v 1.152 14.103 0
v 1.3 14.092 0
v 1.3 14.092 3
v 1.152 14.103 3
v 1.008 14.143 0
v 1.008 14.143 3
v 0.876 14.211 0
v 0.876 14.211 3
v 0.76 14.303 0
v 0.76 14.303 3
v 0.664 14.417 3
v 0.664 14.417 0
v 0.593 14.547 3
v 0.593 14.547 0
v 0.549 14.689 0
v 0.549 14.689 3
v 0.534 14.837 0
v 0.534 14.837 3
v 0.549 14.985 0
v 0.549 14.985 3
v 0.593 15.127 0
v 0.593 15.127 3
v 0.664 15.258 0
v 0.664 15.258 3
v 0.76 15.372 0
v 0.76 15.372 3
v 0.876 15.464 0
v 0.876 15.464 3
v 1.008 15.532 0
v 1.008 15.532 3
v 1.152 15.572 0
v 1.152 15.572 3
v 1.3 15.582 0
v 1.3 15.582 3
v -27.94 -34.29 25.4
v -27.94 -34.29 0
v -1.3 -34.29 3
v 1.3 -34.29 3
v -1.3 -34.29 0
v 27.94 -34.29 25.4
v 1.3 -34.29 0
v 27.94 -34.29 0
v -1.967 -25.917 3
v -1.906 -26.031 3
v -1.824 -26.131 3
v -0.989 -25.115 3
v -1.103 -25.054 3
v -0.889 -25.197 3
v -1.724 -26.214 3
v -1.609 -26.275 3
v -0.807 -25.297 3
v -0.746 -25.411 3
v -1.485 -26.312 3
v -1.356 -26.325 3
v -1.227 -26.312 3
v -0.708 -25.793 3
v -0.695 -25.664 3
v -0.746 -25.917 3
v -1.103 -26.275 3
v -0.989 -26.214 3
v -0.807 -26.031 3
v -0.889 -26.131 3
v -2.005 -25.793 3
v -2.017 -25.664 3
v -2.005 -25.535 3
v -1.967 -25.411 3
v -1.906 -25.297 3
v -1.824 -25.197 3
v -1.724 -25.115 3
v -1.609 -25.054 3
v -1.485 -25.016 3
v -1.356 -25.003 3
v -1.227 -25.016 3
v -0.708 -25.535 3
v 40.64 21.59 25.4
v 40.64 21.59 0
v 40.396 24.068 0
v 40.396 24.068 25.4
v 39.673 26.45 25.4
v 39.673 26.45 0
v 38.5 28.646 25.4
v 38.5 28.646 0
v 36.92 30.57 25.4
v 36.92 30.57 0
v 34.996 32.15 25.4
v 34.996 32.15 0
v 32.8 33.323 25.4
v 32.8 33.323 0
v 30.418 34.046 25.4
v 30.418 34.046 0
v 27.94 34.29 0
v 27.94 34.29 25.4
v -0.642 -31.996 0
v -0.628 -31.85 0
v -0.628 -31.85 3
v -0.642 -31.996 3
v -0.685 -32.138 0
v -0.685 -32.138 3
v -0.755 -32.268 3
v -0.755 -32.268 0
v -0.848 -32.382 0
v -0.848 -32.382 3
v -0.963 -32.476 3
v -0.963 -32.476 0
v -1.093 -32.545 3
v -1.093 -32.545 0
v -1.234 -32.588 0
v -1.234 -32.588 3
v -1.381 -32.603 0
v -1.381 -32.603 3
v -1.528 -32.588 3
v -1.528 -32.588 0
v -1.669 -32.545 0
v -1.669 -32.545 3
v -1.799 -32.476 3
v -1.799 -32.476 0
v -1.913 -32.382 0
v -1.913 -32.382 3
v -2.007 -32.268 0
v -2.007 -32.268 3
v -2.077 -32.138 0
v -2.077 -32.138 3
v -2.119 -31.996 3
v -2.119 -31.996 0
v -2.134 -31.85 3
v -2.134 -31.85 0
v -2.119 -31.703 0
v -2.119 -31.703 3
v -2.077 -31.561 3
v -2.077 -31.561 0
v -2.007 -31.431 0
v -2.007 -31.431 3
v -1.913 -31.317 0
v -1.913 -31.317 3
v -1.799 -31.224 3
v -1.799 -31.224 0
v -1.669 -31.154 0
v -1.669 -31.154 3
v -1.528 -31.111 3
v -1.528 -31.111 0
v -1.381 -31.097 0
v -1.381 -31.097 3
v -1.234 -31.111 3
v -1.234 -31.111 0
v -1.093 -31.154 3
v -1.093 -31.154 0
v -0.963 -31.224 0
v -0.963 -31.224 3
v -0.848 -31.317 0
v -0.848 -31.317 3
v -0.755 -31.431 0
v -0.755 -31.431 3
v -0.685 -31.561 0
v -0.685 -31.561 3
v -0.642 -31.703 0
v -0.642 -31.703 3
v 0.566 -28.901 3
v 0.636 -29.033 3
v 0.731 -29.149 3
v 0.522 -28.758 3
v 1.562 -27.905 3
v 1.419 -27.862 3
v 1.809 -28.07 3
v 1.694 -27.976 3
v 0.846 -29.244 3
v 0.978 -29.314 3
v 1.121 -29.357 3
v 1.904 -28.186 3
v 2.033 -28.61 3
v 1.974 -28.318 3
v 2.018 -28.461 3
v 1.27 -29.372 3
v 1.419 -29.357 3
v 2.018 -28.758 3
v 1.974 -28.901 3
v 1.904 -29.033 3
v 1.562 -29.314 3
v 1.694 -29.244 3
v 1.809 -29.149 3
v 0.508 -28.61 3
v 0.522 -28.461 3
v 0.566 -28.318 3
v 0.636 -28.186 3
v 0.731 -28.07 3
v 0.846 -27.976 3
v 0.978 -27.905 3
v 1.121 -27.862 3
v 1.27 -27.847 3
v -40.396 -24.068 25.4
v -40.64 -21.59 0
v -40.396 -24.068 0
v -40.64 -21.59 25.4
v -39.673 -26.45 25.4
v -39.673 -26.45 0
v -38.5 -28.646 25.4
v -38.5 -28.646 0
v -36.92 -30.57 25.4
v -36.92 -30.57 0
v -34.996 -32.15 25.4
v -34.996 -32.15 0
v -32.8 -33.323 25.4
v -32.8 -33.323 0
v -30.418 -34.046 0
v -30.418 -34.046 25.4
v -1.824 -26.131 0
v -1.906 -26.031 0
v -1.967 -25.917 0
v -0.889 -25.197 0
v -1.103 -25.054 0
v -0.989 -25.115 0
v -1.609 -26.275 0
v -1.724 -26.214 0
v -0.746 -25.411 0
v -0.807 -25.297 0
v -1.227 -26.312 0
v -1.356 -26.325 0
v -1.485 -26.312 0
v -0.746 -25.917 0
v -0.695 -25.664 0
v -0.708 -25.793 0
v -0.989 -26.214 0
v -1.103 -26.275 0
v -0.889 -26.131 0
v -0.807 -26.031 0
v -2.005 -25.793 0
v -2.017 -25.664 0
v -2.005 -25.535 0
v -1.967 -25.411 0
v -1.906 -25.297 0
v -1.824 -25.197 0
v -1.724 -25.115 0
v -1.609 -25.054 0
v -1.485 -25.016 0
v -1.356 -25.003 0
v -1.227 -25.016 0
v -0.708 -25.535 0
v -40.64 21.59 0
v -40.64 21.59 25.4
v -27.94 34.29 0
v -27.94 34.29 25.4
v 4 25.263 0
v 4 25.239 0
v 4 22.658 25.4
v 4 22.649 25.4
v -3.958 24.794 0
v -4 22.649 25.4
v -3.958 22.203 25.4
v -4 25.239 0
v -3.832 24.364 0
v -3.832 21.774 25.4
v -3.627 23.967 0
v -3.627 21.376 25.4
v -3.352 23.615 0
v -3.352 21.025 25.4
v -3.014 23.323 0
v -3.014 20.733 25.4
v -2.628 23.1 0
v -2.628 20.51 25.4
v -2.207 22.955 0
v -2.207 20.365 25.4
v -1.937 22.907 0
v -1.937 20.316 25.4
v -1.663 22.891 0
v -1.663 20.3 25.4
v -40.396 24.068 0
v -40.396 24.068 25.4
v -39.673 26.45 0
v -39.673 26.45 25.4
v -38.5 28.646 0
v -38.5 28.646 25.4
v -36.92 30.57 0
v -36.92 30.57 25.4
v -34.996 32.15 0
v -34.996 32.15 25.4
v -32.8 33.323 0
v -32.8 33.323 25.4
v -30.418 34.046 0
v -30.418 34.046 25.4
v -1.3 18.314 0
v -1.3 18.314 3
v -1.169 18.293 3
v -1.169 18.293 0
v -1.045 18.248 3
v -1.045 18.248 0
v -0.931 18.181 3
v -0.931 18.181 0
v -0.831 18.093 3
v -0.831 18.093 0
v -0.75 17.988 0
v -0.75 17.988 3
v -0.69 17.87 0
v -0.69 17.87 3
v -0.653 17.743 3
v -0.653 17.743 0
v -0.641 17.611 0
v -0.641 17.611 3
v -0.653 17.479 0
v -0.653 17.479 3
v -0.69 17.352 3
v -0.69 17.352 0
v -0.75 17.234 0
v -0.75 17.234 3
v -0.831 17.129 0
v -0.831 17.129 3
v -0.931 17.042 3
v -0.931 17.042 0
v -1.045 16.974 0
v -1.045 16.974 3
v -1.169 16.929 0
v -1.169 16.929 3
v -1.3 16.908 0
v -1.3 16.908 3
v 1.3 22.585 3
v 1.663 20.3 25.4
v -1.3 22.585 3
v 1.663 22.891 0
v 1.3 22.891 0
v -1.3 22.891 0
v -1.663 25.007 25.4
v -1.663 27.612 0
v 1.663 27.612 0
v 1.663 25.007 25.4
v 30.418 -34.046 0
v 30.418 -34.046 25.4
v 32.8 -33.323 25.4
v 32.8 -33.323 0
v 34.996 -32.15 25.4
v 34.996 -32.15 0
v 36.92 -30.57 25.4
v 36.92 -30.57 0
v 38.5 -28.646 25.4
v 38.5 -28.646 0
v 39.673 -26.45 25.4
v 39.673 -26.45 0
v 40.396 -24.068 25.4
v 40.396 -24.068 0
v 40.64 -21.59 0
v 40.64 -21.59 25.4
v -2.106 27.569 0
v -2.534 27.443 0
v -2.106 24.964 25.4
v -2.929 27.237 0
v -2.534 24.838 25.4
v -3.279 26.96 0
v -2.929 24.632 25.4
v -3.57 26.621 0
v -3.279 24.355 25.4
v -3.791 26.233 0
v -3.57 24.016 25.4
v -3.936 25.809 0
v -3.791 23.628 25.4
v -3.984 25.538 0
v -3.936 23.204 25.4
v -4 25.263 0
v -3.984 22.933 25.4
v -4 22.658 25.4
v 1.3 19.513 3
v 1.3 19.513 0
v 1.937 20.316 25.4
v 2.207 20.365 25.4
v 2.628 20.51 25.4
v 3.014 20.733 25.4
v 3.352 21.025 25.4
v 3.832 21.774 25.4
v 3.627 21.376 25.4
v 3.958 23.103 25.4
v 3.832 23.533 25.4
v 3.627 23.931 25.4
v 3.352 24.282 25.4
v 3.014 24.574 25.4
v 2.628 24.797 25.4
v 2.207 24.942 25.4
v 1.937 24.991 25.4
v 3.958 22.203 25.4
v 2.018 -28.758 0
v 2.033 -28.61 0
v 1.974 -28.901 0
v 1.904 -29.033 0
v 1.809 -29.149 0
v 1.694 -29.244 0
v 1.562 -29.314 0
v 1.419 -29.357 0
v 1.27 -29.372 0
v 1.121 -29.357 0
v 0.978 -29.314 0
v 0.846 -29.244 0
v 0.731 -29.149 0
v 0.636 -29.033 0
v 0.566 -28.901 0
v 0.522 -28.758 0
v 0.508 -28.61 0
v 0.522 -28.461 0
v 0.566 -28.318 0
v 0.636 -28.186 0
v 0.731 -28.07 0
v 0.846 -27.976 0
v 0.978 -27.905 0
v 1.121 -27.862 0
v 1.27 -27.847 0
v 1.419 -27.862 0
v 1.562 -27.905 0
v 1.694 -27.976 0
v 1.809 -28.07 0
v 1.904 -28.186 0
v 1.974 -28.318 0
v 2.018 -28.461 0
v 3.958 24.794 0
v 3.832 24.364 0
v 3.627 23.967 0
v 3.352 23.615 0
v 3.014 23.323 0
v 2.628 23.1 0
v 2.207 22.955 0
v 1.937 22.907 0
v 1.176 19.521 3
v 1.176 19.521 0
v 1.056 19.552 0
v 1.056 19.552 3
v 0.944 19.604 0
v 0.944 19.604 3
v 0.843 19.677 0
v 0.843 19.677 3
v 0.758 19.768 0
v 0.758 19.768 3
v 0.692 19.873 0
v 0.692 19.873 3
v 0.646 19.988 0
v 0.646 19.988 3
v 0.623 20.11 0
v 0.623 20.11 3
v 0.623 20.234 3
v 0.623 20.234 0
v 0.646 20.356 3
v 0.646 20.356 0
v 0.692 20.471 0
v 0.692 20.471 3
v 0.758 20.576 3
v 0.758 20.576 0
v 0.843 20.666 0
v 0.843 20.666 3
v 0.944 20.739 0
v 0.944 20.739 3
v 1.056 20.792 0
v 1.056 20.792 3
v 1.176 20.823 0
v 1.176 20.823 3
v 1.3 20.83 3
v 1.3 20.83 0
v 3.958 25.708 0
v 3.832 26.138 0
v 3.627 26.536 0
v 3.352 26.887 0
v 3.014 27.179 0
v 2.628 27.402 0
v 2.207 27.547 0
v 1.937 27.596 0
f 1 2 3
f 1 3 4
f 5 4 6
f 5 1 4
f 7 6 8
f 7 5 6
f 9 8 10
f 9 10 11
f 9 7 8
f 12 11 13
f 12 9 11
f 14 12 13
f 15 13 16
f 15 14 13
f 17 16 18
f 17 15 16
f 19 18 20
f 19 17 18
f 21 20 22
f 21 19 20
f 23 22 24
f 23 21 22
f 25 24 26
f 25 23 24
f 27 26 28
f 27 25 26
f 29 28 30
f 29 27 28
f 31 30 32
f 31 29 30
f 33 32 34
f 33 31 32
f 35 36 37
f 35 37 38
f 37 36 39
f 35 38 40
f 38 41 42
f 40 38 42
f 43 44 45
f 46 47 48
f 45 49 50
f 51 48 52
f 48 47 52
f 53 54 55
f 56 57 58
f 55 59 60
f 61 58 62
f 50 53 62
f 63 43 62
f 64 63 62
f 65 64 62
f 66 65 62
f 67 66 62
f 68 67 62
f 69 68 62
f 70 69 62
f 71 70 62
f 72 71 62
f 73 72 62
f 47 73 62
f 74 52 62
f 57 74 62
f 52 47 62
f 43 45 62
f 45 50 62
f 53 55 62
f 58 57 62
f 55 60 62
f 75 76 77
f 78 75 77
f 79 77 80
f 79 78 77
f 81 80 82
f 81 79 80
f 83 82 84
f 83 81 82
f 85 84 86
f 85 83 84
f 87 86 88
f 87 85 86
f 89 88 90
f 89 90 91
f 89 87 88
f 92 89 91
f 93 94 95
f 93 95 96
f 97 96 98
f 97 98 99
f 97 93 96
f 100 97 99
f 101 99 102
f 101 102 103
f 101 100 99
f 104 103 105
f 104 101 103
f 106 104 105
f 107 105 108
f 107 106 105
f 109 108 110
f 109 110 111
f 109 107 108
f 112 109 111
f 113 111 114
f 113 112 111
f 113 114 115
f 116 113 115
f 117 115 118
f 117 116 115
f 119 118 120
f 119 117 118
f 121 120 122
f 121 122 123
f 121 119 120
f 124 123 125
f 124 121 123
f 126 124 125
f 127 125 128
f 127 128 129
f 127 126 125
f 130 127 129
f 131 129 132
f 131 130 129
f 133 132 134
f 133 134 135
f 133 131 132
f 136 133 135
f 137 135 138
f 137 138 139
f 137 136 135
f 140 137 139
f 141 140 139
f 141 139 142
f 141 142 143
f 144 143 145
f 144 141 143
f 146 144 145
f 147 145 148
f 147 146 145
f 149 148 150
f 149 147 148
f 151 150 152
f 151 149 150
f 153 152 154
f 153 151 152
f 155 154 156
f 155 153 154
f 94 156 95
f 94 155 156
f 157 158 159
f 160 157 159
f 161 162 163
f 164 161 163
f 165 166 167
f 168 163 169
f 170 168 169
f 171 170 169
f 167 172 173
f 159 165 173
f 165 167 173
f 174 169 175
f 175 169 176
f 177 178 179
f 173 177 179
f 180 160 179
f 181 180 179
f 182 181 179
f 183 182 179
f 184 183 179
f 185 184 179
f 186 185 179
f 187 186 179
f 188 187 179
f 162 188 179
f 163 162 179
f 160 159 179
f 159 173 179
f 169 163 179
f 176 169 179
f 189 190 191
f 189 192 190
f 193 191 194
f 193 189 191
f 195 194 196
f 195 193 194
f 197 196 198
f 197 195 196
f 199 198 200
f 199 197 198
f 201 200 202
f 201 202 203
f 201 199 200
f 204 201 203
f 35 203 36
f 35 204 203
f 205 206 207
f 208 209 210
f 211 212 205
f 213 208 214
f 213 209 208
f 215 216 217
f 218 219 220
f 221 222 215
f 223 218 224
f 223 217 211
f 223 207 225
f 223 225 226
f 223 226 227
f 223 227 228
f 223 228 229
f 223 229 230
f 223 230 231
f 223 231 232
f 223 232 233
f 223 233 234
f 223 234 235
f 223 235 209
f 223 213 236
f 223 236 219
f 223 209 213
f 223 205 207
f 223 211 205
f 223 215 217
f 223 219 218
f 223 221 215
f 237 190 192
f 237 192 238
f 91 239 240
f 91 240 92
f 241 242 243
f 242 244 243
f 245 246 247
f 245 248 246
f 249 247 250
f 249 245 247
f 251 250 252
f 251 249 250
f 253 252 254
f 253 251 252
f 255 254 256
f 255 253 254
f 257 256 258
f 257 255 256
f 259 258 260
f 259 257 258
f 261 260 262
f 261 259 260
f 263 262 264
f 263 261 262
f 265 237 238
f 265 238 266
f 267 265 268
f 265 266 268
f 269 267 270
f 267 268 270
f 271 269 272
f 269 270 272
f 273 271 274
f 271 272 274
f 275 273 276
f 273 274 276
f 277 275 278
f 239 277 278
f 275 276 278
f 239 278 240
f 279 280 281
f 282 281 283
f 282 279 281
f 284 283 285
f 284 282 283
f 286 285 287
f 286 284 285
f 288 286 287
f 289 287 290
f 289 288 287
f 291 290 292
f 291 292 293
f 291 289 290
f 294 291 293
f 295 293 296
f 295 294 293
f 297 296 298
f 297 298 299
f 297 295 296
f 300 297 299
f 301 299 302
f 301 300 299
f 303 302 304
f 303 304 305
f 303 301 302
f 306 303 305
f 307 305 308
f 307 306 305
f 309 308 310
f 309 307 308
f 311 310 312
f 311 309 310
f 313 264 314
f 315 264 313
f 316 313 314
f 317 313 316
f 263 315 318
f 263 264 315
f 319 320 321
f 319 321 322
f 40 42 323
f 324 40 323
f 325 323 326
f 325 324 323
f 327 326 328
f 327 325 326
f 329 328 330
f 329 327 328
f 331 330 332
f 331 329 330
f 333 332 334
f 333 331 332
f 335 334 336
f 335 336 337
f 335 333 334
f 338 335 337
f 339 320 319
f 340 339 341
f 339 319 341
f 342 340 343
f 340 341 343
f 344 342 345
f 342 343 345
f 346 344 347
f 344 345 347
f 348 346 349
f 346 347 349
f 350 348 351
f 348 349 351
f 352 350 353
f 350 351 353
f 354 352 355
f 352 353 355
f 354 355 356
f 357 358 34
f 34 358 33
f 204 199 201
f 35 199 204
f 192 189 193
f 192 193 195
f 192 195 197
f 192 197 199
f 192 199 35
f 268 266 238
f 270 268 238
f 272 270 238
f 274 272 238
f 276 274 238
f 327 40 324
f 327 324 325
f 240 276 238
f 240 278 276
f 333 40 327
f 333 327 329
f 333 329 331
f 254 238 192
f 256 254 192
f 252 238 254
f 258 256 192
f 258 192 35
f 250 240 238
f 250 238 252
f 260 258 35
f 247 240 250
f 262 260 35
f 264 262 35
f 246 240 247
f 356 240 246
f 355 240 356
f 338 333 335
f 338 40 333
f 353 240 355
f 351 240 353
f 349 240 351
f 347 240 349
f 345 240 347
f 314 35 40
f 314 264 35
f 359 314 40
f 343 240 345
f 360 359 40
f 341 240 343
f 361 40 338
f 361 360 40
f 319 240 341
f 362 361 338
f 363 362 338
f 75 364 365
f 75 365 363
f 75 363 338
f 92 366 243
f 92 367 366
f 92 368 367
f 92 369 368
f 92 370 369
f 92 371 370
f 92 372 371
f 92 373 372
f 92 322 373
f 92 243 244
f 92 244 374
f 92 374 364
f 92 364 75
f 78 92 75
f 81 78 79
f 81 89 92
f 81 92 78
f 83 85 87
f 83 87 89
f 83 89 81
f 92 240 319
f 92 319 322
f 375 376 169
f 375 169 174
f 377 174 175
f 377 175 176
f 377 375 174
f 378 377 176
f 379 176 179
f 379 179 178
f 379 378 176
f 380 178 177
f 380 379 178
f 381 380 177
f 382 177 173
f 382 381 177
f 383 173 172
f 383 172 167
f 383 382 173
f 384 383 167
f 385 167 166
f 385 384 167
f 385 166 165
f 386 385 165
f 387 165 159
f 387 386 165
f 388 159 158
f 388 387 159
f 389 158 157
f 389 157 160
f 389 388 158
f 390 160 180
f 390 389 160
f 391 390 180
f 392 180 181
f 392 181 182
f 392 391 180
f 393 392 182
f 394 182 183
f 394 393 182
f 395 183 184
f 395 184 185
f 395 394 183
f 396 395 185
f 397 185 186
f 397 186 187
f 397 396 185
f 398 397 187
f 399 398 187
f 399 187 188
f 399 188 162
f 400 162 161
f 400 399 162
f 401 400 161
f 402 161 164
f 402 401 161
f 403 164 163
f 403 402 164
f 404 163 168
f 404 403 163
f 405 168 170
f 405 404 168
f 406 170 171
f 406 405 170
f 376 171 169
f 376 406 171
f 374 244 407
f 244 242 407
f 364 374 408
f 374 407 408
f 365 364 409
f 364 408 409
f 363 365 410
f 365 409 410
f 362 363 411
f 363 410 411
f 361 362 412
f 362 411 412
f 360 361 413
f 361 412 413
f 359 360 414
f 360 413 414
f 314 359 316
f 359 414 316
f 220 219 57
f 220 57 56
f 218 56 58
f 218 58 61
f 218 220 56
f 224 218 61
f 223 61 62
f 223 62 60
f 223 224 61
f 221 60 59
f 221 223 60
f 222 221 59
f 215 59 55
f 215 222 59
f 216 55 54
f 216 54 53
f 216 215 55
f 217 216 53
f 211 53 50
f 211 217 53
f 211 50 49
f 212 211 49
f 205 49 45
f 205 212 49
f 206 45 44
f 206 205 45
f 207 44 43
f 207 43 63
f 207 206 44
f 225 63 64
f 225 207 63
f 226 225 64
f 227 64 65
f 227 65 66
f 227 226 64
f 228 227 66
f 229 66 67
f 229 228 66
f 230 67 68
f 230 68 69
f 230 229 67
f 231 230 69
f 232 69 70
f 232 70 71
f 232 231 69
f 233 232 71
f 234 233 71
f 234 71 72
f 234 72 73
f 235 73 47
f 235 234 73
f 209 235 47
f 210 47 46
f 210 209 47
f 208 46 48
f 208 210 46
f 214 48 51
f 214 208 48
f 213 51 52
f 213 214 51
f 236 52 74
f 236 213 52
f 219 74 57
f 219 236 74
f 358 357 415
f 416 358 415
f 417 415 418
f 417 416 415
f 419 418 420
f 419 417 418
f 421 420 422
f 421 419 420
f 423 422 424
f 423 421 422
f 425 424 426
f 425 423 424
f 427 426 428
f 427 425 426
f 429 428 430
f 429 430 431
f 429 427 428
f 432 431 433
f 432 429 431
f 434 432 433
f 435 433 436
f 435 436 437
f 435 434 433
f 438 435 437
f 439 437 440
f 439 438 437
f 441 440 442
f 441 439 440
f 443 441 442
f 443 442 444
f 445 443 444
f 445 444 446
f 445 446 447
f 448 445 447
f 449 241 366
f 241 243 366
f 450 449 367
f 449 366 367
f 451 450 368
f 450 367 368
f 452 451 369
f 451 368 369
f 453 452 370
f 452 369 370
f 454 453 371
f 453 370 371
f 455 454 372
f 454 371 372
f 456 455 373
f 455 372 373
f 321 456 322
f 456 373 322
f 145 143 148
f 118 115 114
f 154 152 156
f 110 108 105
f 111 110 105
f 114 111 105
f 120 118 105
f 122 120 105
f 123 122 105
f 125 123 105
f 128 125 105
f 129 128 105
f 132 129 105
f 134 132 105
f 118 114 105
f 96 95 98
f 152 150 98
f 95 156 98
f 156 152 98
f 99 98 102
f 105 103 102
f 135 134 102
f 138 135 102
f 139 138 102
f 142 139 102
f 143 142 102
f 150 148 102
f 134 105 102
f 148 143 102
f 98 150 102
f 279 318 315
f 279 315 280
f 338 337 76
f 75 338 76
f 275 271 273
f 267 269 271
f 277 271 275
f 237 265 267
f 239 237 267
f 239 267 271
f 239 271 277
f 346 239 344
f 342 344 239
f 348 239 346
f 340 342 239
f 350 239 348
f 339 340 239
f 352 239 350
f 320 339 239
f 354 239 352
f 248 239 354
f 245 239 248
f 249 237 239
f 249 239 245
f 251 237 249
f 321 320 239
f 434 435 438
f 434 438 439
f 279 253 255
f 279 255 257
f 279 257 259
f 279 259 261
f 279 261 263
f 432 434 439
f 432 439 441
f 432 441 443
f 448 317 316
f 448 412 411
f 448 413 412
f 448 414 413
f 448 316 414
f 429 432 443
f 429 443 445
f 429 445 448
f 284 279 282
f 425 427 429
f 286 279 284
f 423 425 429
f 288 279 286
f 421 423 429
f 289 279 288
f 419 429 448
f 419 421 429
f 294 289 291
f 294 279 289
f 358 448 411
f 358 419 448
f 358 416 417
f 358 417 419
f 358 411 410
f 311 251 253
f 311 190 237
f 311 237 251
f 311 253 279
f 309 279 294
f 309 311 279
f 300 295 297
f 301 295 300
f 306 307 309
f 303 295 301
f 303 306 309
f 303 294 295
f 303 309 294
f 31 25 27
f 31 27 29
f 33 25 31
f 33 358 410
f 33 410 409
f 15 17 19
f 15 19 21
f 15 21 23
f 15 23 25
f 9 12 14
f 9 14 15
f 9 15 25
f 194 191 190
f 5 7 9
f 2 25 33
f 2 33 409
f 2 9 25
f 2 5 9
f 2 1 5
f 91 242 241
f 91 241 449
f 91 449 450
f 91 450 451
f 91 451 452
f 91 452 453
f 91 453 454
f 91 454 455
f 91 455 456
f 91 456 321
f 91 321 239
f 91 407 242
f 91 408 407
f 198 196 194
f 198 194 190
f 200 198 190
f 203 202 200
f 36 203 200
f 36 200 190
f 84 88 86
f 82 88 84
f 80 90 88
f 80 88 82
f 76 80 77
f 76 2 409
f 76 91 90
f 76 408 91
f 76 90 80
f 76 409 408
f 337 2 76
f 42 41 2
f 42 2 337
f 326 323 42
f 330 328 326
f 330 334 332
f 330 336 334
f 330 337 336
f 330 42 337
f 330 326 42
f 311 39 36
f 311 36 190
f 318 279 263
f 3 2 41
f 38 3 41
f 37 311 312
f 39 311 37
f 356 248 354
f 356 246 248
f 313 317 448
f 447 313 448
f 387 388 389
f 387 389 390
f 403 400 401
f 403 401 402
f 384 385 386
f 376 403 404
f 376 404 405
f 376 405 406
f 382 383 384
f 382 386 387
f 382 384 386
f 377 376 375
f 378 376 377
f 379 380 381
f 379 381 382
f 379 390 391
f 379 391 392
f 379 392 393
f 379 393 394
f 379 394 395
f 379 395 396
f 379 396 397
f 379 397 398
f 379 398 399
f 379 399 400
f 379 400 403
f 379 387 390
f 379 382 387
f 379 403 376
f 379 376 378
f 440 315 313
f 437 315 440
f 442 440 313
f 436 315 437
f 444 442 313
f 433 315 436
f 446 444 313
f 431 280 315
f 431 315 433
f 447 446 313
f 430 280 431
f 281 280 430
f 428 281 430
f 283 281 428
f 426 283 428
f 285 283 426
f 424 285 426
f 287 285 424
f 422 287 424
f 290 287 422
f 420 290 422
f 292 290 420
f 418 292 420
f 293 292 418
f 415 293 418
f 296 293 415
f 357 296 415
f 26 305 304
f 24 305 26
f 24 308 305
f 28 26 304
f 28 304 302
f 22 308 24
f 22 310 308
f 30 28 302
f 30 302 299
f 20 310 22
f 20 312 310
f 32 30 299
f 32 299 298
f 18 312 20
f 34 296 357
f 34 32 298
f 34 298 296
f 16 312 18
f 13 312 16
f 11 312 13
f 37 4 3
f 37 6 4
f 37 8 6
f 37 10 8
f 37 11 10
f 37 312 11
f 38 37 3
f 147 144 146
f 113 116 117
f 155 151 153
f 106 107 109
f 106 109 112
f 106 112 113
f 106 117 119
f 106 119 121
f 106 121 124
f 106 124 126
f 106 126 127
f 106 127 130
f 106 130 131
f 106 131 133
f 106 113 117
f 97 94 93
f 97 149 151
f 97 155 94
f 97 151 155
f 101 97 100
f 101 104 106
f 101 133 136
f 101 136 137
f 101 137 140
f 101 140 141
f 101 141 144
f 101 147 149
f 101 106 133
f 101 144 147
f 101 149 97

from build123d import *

# Parameters (mm, degrees)
F0_W      = 81.28
F0_H      = 68.58
F1_DEPTH  = 25.4
F2_R      = 12.7
F6_DEPTH  = 4
F7_DEPTH  = 4
F8_R      = 2.3368
F9_W      = 2.6
F9_H      = 63.246
F10_DEPTH = 3
F11_R     = 0.704457
F11_R_2   = 0.745283
F11_R_3   = 0.659045
F12_DEPTH = 3
F13_R     = 0.752956
F13_R_2   = 0.762497
F13_R_3   = 0.660913
F14_DEPTH = 3


with BuildPart() as f1:
    # F0 (on Top) → F1 (new body)
    with BuildSketch(Plane.XY):
        Rectangle(F0_W, F0_H)
    extrude(amount=F1_DEPTH)

    # F2
    f2_edges = [f1.edges().sort_by_distance(p)[0] for p in [
        (-40.64, 34.29, 12.7),
        (40.64, 34.29, 12.7),
        (40.64, -34.29, 12.7),
        (-40.64, -34.29, 12.7),
    ]]
    fillet(f2_edges, radius=F2_R)

    # F5 (on Right) → F6 (cut)
    with BuildSketch(Plane.YZ):
        Polygon((25.001539, 25.452133), (20.298591, 25.414156), (22.890521, 0), (27.611947, 0), align=None)
    extrude(amount=-F6_DEPTH, mode=Mode.SUBTRACT)

    # F5 (on Right) → F7 (cut)
    with BuildSketch(Plane.YZ):
        Polygon((25.001539, 25.452133), (20.298591, 25.414156), (22.890521, 0), (27.611947, 0), align=None)
    extrude(amount=F7_DEPTH, mode=Mode.SUBTRACT)

    # F8
    f8_edges = [f1.edges().sort_by_distance(p)[0] for p in [
        (4, 26.309416, 12.7),
        (4, 21.595278, 12.7),
        (-4, 21.595278, 12.7),
        (-4, 26.309416, 12.7),
    ]]
    fillet(f8_edges, radius=F8_R)

    # F9 (on face) → F10 (cut)
    with BuildSketch(Plane(origin=(0, 0, 0), x_dir=(1, 0, 0), z_dir=(0, 0, -1))):
        with Locations((0, 8.263034)):
            Rectangle(F9_W, F9_H)
    extrude(amount=-F10_DEPTH, mode=Mode.SUBTRACT)

    # F11 (on face) → F12 (join)
    with BuildSketch(Plane(origin=(0, 0, 0), x_dir=(1, 0, 0), z_dir=(0, 0, -1))):
        with Locations((-1.345439, -17.611282)):
            Circle(F11_R)
        with Locations((1.279058, -14.837421)):
            Circle(F11_R_2)
        with Locations((1.279058, -20.171767)):
            Circle(F11_R_3)
    extrude(amount=-F12_DEPTH)


with BuildPart() as f14:
    # F13 (on face) → F14 (new body)
    with BuildSketch(Plane(origin=(0, 0, 0), x_dir=(1, 0, 0), z_dir=(0, 0, -1))):
        with Locations((-1.380891, 31.849604)):
            Circle(F13_R)
        with Locations((1.270037, 28.609581)):
            Circle(F13_R_2)
        with Locations((-1.356346, 25.664104)):
            Circle(F13_R_3)
    extrude(amount=-F14_DEPTH)


solid = Compound([f1.part, f14.part])
